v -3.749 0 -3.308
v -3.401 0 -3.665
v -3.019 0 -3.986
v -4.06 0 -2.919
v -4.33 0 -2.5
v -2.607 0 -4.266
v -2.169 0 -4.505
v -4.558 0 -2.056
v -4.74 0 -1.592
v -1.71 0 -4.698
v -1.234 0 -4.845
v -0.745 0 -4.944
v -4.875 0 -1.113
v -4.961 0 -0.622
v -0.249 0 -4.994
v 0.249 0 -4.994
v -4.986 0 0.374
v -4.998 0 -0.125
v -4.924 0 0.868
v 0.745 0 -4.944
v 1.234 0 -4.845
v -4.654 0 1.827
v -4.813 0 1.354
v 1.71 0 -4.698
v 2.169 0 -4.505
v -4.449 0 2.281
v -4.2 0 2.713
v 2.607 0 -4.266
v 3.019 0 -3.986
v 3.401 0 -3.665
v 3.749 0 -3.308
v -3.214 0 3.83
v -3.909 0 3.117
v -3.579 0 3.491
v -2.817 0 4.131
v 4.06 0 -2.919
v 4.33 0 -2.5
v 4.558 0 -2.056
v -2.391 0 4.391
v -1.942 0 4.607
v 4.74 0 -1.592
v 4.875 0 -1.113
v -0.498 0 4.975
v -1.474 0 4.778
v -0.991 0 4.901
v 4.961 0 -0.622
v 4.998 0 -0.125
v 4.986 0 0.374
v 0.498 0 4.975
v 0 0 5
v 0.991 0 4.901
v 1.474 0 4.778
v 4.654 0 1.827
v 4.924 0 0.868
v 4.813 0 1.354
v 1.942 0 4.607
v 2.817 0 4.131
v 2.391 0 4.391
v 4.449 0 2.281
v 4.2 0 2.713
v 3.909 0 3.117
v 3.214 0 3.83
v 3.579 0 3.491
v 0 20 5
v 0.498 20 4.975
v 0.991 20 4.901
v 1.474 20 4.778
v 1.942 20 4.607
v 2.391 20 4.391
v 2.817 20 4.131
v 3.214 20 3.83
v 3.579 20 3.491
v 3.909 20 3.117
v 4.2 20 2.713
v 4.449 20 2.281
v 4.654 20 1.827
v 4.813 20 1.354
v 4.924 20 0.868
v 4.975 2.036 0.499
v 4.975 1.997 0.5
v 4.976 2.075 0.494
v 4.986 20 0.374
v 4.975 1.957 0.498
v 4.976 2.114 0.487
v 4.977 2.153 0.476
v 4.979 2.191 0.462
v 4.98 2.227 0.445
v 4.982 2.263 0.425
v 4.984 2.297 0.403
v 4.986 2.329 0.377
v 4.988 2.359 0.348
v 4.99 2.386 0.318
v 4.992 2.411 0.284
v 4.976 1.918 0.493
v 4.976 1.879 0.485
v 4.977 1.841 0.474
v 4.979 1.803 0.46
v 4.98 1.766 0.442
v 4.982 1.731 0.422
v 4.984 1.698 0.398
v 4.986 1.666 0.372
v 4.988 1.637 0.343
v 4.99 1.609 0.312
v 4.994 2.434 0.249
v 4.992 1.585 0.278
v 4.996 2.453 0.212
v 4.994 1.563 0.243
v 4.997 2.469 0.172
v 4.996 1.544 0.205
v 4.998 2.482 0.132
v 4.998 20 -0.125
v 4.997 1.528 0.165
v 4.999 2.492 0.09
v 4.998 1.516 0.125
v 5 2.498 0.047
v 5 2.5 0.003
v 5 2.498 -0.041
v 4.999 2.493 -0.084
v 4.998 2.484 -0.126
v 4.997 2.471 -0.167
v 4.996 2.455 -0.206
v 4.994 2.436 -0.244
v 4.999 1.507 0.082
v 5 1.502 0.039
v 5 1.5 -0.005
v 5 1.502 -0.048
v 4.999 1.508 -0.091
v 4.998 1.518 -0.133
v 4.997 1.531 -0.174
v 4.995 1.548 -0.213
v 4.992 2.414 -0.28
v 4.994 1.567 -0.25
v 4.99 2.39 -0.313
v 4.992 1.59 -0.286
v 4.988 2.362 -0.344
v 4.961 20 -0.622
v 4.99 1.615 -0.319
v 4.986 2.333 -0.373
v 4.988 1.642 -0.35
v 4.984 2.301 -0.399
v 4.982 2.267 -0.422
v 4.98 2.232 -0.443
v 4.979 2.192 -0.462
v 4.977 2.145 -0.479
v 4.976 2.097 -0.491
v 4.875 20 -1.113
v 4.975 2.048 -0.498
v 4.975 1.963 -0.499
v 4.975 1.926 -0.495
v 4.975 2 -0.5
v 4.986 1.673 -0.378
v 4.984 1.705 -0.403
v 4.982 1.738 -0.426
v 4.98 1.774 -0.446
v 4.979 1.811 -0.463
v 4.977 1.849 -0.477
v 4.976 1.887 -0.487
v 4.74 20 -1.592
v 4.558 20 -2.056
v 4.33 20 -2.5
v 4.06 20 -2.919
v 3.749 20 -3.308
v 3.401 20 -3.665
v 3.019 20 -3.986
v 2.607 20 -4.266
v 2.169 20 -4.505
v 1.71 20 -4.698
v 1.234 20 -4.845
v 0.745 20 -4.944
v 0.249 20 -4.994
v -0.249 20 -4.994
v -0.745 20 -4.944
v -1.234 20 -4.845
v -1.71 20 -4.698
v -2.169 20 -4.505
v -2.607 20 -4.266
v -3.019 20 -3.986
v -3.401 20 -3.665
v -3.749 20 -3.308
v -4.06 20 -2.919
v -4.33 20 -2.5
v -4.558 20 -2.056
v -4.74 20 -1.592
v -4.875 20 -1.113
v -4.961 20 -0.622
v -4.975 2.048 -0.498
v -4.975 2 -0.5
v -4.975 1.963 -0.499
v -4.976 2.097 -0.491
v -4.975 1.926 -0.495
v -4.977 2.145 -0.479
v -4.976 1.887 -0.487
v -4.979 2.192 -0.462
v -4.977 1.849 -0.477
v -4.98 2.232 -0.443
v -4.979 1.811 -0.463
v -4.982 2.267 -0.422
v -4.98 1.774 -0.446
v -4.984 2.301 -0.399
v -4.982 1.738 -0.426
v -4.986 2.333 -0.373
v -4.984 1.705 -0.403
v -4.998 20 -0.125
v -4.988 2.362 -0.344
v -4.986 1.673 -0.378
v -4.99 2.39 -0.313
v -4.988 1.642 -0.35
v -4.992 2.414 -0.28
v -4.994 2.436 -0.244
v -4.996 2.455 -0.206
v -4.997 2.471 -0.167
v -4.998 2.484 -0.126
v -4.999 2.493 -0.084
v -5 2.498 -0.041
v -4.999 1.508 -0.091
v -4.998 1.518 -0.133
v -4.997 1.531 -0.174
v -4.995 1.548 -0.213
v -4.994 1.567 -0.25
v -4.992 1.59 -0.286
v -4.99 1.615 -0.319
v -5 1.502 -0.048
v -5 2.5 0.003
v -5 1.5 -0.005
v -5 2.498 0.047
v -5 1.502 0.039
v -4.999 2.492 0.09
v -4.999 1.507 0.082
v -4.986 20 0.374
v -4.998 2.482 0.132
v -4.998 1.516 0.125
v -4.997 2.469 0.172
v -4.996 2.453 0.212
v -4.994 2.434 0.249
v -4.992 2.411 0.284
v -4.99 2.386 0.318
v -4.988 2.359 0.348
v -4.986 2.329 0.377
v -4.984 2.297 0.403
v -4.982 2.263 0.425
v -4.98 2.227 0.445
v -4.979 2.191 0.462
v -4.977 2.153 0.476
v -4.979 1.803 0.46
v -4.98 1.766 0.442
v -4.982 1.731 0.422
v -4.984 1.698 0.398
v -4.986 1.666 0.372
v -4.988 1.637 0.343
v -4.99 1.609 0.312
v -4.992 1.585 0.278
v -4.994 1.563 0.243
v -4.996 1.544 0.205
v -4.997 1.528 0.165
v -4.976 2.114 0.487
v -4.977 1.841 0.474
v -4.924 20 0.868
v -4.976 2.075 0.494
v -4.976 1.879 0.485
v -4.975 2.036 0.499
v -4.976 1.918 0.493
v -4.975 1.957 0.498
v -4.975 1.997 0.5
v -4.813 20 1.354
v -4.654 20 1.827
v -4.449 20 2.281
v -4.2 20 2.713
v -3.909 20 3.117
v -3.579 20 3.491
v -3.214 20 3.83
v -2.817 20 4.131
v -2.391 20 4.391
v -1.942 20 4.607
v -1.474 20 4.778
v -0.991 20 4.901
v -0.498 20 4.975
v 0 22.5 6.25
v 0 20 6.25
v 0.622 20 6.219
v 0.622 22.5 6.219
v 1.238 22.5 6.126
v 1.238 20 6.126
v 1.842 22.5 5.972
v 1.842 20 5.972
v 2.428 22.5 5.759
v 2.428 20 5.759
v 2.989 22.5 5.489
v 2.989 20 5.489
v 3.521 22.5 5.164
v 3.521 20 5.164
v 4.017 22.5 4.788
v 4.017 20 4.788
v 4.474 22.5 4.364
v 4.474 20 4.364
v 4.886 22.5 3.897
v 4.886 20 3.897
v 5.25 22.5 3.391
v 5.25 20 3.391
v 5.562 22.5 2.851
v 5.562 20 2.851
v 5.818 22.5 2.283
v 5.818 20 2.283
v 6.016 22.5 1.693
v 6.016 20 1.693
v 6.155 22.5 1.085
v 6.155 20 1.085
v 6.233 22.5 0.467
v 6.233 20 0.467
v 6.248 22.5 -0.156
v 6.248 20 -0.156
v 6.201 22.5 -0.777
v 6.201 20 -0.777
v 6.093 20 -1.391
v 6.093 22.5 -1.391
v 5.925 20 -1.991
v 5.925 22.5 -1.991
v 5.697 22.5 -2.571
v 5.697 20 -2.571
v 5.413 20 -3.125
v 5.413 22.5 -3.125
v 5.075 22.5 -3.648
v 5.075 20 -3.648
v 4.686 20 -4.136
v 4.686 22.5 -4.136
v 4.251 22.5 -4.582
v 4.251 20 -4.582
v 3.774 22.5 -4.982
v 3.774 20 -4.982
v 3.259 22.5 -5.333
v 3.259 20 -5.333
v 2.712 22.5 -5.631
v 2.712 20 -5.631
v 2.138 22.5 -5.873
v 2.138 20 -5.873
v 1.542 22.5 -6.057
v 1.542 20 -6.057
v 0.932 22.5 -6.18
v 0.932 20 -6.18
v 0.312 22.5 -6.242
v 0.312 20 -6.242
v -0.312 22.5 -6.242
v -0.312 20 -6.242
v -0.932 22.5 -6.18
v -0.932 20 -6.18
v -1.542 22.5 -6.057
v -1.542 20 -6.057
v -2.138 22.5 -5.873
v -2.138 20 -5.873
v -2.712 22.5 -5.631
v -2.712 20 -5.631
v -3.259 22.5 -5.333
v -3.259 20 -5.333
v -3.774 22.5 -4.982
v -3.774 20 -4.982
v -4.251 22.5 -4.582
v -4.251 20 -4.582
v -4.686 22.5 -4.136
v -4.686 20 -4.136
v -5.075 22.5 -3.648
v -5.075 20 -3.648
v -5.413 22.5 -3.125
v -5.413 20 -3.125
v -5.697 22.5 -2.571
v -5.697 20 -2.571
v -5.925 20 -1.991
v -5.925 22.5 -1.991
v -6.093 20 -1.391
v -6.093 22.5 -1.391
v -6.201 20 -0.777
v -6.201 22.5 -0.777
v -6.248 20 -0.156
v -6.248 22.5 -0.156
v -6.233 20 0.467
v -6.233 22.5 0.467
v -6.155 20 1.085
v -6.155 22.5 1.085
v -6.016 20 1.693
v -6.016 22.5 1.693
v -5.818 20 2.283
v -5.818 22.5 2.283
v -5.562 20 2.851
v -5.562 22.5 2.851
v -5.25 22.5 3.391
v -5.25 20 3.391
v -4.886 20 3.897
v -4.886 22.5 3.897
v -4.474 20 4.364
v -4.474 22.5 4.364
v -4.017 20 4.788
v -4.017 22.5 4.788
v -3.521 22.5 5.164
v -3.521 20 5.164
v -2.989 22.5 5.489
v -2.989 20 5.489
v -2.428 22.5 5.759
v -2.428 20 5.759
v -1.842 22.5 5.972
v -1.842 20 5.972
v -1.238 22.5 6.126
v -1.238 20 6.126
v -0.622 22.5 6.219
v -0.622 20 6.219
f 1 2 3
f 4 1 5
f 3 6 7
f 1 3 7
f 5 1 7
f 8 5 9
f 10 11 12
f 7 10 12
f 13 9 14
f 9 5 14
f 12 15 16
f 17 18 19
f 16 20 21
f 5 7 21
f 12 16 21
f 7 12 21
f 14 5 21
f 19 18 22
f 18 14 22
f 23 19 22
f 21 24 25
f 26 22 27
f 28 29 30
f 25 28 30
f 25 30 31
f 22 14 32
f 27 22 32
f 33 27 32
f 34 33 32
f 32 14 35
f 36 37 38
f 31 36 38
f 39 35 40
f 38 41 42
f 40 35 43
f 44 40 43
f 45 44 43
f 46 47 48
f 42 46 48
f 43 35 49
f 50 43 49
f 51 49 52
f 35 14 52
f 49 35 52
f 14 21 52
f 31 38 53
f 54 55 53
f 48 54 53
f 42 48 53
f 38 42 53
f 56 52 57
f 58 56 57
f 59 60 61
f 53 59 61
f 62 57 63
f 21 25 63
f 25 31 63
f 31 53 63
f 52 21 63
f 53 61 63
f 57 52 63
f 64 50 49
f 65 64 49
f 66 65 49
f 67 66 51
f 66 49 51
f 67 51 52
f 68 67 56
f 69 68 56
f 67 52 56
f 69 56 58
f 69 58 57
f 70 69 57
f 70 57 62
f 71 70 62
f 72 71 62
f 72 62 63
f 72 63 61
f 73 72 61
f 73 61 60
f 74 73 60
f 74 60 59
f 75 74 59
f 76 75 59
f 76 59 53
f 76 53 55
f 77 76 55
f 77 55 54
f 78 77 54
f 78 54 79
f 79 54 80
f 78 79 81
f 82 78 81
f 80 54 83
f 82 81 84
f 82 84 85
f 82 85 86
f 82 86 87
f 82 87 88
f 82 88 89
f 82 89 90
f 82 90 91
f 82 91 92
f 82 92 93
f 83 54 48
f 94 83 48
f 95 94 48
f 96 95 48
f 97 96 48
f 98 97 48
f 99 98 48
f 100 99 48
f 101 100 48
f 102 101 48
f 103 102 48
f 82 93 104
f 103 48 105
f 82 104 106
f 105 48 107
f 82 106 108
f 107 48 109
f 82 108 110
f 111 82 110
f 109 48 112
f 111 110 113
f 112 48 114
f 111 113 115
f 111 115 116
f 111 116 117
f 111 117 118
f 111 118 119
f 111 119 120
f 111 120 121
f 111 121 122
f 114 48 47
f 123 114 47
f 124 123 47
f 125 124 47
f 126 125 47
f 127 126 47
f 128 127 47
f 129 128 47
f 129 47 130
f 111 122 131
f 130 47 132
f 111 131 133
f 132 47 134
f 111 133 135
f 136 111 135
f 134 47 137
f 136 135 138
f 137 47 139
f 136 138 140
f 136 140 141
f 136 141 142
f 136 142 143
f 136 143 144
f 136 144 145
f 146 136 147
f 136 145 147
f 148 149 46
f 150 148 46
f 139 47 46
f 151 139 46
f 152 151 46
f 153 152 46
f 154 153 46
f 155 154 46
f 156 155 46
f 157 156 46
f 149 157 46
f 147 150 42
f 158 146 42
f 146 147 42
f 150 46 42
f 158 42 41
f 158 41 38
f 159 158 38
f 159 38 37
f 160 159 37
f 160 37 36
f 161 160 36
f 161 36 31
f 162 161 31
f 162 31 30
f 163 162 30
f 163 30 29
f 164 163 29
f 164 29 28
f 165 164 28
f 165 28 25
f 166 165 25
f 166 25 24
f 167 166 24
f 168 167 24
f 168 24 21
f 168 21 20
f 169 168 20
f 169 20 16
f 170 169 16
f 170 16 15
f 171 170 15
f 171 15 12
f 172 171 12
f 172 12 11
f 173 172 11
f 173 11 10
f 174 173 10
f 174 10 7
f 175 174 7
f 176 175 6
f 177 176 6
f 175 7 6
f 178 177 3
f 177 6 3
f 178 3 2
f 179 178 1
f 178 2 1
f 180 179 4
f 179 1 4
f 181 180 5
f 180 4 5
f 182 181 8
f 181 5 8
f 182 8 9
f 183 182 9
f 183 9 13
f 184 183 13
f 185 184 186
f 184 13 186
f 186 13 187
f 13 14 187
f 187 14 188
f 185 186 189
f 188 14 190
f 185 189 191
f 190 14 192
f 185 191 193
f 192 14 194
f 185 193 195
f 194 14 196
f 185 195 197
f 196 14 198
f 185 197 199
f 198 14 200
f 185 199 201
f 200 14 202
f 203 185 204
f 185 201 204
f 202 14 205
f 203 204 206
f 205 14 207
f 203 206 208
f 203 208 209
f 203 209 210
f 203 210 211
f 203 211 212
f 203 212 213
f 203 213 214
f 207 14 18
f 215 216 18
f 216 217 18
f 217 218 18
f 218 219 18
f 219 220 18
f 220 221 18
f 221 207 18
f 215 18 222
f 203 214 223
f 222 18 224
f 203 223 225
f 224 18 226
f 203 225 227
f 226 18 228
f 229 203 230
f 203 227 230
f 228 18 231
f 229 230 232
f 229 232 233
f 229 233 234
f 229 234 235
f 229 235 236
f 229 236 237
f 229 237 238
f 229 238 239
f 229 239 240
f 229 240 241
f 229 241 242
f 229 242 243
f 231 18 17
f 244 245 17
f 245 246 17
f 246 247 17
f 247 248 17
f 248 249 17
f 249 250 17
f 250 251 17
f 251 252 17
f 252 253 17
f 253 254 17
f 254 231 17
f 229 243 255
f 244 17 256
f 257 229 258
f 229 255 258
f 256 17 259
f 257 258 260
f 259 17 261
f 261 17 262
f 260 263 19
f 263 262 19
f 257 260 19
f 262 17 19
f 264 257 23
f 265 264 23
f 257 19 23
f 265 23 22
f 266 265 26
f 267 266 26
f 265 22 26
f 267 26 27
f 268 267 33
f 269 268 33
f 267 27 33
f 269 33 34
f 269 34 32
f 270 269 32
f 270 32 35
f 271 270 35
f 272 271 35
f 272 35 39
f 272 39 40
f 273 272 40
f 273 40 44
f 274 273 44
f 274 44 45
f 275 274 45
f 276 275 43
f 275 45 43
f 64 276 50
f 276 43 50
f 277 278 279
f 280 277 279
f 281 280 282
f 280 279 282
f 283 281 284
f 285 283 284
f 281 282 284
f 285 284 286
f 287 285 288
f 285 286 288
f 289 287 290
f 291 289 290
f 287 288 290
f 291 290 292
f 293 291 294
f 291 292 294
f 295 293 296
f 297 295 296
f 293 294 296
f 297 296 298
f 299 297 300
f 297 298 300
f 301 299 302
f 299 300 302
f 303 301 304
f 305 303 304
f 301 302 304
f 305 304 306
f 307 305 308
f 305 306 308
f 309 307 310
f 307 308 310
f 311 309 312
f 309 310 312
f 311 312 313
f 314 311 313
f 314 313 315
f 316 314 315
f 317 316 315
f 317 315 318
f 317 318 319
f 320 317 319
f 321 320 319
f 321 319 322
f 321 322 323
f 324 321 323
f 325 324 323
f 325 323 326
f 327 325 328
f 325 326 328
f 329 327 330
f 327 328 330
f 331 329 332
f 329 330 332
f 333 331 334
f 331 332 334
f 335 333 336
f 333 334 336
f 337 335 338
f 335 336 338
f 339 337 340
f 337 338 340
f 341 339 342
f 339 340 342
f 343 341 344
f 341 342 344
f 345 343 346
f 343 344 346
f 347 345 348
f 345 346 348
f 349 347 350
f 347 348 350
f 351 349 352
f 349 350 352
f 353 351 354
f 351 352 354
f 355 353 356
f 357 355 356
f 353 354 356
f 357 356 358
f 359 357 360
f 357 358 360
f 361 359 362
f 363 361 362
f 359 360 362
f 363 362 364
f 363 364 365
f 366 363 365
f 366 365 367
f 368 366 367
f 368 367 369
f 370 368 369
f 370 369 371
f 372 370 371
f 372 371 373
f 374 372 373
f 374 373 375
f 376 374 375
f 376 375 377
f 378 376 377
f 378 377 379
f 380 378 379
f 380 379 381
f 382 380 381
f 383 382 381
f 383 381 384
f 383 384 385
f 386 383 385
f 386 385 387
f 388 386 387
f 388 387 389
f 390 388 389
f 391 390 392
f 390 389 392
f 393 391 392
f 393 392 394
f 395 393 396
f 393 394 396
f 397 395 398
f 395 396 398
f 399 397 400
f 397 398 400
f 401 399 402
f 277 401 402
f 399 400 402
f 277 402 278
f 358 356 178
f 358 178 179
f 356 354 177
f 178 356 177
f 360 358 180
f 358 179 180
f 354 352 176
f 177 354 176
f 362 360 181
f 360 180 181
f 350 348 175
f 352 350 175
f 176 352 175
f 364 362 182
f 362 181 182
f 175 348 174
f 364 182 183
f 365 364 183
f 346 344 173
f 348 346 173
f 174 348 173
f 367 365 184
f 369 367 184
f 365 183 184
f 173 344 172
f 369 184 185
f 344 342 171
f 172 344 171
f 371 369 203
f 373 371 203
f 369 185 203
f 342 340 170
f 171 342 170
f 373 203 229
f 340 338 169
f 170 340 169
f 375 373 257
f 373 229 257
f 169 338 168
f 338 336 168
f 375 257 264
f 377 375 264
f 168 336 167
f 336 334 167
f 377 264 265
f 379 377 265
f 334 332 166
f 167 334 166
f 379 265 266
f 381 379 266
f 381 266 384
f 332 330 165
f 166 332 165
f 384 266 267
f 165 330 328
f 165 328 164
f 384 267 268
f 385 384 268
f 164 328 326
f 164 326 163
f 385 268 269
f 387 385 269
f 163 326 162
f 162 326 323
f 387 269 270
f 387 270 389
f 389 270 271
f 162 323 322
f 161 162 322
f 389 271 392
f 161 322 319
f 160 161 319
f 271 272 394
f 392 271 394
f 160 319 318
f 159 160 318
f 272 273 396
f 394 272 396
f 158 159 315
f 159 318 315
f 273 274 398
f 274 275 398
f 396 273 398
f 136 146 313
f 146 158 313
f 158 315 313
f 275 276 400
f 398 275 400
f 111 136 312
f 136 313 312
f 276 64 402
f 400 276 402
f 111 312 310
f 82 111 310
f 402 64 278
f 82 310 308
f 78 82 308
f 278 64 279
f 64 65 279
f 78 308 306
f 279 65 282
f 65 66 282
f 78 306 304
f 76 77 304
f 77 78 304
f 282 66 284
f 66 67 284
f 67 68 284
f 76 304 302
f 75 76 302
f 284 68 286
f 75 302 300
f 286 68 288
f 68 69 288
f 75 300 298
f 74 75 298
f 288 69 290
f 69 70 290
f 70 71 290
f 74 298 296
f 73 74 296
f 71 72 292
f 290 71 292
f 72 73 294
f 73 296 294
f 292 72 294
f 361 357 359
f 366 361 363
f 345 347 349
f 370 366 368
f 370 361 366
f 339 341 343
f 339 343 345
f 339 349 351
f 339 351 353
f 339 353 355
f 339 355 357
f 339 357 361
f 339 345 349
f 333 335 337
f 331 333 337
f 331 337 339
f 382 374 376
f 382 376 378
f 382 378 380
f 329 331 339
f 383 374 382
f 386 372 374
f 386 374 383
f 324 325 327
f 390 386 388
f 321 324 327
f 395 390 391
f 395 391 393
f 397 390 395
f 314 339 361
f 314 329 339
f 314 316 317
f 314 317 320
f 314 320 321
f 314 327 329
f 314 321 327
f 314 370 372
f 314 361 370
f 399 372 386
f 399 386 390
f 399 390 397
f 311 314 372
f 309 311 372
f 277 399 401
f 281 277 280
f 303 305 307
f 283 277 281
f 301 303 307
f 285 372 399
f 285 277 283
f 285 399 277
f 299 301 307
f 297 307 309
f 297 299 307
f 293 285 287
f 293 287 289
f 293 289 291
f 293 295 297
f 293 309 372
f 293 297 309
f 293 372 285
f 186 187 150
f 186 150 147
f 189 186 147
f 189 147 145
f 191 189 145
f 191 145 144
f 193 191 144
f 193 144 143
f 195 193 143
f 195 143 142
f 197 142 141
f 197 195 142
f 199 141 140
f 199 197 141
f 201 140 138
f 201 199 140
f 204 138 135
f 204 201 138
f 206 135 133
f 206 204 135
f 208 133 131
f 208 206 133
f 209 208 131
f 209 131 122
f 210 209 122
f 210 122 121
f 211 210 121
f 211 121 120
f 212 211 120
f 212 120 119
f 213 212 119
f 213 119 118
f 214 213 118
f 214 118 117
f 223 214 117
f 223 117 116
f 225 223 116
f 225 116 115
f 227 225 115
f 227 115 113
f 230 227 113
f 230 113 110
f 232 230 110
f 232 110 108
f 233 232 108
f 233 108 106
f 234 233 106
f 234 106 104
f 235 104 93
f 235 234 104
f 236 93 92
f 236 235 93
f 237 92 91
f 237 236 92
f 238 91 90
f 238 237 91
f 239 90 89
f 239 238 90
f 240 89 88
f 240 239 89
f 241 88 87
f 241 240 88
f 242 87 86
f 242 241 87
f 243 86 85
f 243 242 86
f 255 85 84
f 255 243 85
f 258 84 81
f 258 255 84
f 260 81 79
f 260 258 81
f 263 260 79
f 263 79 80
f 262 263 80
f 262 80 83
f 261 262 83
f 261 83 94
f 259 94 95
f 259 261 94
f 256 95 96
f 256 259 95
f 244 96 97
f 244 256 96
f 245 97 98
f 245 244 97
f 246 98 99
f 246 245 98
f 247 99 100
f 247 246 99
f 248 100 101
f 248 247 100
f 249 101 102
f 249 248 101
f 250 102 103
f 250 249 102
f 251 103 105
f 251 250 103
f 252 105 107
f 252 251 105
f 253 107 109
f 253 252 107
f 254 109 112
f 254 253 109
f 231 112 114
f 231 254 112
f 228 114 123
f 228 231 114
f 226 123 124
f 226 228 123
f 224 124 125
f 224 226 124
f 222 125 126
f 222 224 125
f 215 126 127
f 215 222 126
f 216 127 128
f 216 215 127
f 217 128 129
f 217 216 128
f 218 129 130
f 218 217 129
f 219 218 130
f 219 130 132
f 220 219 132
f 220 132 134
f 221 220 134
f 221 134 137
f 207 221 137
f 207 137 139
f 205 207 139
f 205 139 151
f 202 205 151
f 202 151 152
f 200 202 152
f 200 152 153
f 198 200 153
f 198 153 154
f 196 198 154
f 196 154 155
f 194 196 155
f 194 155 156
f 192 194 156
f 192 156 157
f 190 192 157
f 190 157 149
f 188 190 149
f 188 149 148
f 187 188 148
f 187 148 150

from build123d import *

# Parameters (mm, degrees)
SKETCH1_R               = 5
BOSS_EXTRUDE1_DEPTH     = 20
SKETCH3_R               = 6.25
BOSS_EXTRUDE3_DEPTH     = 2.5
CUT_EXTRUDE1_DEPTH      = 25.173849507
CUT_EXTRUDE1_DEPTH_BACK = 25.173849507
SKETCH4_R               = 0.5


with BuildPart() as part:
    # Sketch1 → Boss-Extrude1 (new body)
    with BuildSketch(Plane(origin=(0, 0, 0), x_dir=(1, 0, 0), z_dir=(0, 1, 0))):
        with Locations(Location((0, 0, 0), (0, 0, 270))):
            Circle(SKETCH1_R)
    extrude(amount=BOSS_EXTRUDE1_DEPTH)

    # Sketch3 → Boss-Extrude3 (add)
    with BuildSketch(Plane(origin=(0, 20, 0), x_dir=(1, 0, 0), z_dir=(0, 1, 0))):
        with Locations(Location((0, 0, 0), (0, 0, 270))):
            Circle(SKETCH3_R)
    extrude(amount=BOSS_EXTRUDE3_DEPTH)

    # Sketch4 → Cut-Extrude1 (cut, two sides: drawn at the far end of the back side and taken through both)
    with BuildSketch(Plane(origin=(0, 0, 0), x_dir=(0, 0, -1), z_dir=(1, 0, 0)).offset(-CUT_EXTRUDE1_DEPTH_BACK)):
        with Locations((0, 2)):
            Circle(SKETCH4_R)
    extrude(amount=CUT_EXTRUDE1_DEPTH + CUT_EXTRUDE1_DEPTH_BACK, mode=Mode.SUBTRACT)


solid = part.part
